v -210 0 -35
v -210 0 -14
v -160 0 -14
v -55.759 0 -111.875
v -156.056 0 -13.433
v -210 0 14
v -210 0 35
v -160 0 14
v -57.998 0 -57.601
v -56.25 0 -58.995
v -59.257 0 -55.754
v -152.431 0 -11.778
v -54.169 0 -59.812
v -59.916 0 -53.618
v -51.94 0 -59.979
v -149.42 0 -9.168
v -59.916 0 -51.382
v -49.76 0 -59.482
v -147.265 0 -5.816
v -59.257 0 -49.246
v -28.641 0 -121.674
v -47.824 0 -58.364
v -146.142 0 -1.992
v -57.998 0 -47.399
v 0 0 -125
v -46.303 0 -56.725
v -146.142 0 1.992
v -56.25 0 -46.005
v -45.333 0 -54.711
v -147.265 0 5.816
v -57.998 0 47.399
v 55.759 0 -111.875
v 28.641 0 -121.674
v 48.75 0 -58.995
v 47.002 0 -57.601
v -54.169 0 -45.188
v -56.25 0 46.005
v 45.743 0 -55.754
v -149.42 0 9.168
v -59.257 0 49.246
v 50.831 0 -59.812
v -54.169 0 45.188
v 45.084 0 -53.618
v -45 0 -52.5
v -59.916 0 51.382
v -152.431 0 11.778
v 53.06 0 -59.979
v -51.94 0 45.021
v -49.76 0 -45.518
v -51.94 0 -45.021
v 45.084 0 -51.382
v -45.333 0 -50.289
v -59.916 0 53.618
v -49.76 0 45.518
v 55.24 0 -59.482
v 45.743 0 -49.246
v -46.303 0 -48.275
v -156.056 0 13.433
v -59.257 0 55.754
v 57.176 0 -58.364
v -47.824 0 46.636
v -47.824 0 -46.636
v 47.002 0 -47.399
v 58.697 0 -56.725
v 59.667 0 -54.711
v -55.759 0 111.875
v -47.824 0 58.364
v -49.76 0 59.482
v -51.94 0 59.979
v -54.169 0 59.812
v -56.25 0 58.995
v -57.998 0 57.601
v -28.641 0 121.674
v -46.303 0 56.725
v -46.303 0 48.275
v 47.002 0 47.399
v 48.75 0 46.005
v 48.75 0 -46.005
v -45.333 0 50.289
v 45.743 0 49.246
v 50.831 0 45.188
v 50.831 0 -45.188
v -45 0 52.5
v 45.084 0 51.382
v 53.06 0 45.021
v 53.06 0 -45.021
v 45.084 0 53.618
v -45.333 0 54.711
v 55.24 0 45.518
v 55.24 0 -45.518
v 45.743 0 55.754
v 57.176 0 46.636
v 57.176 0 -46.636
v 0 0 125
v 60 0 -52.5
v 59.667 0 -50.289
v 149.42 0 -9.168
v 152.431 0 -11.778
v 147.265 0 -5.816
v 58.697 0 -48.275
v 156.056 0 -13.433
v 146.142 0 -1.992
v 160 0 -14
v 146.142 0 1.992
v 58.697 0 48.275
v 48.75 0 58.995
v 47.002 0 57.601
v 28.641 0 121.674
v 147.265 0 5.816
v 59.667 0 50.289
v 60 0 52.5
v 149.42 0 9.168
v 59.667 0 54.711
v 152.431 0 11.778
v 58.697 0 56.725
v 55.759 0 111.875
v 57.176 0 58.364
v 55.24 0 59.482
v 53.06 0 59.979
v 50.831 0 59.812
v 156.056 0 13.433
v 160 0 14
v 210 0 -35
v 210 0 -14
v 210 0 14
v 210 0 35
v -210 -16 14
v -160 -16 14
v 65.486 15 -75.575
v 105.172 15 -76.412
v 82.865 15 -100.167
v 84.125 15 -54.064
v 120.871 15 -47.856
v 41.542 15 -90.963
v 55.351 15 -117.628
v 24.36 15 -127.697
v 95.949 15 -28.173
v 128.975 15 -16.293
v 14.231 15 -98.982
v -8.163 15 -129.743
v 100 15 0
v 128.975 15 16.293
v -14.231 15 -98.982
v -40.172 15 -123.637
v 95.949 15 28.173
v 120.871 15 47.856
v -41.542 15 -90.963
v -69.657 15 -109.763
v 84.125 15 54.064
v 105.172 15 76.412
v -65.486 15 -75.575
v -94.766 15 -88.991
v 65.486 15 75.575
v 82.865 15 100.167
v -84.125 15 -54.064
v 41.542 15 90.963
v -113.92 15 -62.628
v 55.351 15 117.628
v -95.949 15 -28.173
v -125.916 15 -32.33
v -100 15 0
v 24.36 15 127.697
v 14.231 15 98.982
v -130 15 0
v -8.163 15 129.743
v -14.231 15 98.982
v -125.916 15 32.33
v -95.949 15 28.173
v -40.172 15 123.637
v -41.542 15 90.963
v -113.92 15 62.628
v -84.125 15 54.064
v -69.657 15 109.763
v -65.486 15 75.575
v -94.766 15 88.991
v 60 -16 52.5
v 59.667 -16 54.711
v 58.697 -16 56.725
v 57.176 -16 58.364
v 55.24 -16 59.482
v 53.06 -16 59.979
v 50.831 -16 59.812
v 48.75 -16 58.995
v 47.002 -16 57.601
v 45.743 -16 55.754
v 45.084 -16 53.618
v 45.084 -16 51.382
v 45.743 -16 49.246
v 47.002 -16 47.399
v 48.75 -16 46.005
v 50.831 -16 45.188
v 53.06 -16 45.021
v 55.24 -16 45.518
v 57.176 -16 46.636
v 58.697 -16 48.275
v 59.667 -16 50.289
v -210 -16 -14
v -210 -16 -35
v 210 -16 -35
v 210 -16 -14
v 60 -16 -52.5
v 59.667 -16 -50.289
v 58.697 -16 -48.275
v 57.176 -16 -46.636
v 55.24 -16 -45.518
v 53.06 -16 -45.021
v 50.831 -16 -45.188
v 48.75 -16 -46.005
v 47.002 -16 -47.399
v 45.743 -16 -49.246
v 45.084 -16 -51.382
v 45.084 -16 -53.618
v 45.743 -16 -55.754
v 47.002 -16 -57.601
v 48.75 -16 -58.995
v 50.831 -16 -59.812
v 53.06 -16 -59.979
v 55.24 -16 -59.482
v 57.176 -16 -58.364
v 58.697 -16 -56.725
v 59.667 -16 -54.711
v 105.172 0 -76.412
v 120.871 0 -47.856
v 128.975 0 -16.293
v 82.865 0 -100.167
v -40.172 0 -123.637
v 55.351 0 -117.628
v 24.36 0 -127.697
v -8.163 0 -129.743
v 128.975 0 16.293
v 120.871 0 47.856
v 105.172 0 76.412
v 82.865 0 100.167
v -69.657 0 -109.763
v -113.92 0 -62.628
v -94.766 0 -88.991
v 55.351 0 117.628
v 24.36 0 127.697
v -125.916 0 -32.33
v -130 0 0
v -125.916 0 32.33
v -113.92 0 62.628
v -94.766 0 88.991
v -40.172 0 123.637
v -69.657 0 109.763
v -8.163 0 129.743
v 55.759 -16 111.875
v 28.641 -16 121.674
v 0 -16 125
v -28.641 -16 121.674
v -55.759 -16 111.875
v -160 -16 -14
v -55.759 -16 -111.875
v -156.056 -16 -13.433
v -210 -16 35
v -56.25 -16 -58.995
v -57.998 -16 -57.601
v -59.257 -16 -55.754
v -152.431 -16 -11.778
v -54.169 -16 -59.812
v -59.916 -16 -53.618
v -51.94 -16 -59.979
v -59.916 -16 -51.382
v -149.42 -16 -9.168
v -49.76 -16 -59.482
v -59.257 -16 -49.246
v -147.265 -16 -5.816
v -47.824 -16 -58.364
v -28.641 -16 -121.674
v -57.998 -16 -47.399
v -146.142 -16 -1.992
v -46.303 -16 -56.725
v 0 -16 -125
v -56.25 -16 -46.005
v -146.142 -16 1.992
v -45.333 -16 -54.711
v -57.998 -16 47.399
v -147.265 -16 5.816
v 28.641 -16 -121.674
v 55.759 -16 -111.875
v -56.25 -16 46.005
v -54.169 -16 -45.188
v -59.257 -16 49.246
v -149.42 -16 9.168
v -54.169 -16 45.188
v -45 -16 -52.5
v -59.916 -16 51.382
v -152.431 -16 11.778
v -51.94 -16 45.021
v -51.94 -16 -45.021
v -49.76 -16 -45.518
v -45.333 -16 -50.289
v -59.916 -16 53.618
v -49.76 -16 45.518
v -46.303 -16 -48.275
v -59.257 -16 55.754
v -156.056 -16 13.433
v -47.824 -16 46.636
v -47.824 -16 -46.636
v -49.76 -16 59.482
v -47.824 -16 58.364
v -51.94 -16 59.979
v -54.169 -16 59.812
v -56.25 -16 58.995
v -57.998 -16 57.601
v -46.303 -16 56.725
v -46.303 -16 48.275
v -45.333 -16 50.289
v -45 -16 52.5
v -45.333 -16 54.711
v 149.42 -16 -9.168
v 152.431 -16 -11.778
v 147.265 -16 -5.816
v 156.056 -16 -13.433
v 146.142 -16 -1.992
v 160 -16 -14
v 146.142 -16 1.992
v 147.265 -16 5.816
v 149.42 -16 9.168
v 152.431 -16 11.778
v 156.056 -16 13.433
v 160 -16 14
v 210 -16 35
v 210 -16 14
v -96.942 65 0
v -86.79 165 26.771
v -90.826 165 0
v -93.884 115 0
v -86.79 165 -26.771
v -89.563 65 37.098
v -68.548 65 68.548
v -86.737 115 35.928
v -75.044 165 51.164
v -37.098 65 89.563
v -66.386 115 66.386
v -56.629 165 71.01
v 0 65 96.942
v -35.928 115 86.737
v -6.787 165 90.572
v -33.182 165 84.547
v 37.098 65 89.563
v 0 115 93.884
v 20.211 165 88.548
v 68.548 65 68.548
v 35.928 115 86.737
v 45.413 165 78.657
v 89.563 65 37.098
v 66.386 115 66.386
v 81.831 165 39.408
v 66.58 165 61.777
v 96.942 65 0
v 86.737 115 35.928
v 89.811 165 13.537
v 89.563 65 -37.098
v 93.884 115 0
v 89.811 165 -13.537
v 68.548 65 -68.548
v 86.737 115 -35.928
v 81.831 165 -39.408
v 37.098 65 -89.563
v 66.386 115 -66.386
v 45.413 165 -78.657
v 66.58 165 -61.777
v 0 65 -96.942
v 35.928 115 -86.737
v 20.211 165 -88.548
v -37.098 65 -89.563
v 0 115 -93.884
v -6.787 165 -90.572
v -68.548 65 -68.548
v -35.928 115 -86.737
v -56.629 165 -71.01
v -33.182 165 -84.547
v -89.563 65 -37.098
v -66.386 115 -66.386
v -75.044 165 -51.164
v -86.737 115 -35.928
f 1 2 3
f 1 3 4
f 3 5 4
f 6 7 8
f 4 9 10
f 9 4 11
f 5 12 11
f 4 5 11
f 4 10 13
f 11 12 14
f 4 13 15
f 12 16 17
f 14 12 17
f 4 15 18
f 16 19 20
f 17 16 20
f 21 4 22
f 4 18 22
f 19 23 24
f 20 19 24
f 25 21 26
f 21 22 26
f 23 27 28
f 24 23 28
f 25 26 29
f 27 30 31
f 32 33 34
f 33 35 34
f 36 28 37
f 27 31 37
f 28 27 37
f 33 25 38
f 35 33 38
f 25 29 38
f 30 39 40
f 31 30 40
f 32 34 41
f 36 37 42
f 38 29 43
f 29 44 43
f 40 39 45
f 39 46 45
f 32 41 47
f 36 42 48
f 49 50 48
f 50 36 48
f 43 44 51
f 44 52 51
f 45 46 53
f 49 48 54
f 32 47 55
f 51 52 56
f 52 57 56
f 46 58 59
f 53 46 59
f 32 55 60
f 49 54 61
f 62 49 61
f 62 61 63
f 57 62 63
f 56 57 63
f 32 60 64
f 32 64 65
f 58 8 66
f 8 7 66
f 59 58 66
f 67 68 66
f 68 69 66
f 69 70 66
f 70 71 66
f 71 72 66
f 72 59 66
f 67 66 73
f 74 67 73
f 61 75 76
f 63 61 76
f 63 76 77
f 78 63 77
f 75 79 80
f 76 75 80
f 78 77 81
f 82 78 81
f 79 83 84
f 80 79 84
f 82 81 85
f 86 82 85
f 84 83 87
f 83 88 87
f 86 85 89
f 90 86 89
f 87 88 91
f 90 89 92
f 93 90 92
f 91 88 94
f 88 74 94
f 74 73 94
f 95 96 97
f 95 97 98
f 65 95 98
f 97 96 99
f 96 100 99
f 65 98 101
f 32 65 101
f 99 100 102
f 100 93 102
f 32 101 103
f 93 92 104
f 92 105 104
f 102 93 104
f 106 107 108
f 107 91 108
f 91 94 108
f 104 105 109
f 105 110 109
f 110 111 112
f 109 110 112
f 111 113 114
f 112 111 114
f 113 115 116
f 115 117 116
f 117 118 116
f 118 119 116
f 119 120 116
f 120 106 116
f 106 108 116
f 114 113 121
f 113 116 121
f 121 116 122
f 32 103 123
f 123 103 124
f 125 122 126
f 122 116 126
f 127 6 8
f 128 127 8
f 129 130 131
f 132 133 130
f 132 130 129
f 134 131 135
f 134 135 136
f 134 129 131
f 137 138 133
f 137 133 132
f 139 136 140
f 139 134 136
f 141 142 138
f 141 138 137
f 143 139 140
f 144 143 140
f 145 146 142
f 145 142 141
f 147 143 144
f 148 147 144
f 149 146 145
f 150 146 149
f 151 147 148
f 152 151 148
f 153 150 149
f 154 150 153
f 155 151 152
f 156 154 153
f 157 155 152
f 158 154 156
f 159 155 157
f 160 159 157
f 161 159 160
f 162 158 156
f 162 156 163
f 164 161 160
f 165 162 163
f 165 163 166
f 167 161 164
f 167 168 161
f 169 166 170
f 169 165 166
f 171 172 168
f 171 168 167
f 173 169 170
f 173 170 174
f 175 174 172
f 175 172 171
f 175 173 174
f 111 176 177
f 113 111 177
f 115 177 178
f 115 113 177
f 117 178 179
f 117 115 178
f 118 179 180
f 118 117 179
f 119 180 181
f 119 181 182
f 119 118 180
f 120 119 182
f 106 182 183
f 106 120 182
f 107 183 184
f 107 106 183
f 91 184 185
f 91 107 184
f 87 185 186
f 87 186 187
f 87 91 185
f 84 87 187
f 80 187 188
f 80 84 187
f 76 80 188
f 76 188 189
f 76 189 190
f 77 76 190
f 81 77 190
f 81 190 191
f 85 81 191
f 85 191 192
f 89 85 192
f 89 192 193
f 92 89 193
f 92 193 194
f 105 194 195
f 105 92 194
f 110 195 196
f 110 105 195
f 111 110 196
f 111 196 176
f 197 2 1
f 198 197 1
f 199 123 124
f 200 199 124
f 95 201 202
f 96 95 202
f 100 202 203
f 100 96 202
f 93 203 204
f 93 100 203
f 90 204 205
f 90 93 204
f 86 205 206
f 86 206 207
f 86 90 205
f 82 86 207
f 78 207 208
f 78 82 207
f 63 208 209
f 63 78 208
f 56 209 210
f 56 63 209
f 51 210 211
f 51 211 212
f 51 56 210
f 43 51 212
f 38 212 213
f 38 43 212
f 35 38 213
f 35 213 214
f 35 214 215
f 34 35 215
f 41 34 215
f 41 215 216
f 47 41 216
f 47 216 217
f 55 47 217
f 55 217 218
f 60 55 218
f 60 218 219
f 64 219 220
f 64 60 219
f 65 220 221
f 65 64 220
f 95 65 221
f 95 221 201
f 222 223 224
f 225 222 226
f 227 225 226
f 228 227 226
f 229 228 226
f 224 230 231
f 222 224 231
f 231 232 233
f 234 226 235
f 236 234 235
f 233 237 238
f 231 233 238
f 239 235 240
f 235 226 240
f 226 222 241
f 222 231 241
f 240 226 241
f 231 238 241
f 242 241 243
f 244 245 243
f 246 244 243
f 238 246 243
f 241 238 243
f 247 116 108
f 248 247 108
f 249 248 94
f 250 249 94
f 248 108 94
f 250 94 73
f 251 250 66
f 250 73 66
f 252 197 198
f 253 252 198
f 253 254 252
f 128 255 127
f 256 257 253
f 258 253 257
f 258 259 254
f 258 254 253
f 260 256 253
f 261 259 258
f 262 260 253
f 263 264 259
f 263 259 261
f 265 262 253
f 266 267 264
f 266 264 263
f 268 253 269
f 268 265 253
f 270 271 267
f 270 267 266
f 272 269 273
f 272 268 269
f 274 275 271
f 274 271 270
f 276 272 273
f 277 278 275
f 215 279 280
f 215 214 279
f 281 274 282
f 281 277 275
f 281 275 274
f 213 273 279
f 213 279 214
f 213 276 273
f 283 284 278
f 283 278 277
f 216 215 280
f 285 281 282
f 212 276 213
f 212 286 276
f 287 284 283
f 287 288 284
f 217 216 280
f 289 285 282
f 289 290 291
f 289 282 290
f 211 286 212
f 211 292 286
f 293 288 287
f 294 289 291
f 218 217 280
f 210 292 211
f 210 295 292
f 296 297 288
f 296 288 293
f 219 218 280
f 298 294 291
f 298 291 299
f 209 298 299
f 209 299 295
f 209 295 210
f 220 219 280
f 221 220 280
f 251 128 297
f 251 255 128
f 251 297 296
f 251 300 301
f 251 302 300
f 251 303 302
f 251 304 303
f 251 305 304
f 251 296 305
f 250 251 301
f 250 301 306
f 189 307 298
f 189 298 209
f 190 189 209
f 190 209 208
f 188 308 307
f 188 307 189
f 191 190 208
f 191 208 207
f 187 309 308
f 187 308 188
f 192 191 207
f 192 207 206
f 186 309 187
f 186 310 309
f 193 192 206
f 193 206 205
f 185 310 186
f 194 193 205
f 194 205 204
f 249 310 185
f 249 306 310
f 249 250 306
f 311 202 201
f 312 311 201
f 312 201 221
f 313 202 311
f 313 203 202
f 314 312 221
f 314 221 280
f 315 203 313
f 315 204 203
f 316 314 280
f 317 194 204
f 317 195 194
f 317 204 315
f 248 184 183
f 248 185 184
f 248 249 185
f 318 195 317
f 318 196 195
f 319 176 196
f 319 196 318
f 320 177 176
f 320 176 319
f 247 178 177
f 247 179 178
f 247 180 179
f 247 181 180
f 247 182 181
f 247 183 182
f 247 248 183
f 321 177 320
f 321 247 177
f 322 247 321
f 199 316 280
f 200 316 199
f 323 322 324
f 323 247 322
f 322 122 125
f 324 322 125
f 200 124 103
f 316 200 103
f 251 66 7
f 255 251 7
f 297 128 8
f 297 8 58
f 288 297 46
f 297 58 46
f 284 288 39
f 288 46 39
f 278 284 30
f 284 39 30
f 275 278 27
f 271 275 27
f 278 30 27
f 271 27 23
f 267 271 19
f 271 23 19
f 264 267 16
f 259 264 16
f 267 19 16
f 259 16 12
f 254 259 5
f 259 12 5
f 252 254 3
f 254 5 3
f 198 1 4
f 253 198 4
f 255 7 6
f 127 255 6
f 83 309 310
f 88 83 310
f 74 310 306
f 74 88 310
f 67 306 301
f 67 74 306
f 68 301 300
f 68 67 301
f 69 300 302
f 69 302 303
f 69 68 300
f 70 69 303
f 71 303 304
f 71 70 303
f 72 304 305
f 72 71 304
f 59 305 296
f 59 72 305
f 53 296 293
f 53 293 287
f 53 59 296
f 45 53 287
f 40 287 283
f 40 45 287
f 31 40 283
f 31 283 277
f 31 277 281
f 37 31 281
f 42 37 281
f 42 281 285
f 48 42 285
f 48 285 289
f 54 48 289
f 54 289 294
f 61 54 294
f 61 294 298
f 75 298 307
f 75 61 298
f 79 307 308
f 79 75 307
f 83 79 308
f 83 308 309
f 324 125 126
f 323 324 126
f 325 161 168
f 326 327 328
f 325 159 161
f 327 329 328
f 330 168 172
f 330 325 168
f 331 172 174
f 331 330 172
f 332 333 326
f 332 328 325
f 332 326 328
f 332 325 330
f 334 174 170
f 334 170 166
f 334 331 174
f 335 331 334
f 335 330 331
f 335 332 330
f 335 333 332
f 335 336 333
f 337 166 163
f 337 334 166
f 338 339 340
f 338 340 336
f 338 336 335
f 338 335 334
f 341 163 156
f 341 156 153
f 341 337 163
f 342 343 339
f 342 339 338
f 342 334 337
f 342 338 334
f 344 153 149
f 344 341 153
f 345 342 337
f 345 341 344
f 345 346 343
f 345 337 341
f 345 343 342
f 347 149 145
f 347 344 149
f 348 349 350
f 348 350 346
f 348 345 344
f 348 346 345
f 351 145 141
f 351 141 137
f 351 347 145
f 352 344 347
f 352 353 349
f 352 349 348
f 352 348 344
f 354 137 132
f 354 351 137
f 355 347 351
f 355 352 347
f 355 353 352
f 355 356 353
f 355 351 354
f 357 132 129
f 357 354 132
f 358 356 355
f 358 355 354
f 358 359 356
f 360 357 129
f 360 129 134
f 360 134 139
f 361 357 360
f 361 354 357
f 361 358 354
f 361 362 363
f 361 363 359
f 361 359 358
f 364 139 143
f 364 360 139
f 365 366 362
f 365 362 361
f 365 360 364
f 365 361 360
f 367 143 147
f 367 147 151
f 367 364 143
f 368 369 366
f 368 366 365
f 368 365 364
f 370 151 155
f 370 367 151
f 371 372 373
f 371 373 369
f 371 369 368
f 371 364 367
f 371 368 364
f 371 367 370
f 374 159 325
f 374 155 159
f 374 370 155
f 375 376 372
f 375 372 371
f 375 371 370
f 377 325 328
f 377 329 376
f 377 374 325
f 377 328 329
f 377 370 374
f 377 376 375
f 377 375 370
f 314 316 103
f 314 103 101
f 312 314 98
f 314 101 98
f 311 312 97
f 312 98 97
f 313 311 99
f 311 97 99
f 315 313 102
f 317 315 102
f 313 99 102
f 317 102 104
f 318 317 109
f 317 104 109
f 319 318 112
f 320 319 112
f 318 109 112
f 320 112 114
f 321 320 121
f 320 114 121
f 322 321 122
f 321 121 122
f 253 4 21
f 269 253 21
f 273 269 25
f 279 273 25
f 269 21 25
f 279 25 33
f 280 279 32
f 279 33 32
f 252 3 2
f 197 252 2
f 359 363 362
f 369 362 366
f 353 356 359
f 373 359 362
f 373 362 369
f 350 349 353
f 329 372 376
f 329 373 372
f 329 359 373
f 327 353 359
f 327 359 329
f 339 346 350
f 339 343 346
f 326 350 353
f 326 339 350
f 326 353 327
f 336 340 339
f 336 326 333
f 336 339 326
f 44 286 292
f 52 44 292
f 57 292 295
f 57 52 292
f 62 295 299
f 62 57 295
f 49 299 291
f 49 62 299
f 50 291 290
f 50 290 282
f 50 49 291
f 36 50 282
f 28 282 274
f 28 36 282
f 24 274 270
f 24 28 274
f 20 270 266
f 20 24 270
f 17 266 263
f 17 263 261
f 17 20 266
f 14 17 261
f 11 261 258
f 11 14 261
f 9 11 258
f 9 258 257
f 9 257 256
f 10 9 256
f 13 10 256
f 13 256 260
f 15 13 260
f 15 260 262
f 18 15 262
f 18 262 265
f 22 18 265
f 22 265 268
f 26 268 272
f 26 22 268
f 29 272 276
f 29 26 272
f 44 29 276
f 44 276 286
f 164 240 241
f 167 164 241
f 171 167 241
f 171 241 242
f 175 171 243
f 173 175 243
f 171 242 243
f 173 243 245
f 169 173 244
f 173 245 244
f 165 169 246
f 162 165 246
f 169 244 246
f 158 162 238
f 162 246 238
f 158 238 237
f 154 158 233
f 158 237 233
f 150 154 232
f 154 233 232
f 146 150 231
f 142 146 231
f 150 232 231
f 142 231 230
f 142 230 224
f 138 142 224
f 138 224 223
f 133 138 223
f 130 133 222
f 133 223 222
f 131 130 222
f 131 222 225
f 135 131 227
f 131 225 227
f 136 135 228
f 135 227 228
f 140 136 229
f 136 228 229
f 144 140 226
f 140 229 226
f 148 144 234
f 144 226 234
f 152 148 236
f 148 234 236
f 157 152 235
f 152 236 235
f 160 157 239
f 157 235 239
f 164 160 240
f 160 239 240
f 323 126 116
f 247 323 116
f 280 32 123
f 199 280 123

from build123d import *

# Parameters (mm, degrees)
F0_R     = 7.5
F1_DEPTH = 16
F2_R     = 130
F3_DEPTH = 15
F4_R     = 100
F5_DEPTH = 150
F5_TAPER = 3.5


with BuildPart() as f1:
    # F0 (on Front) → F1 (new body)
    with BuildSketch(Plane.XZ):
        with BuildLine():
            Line((-210, -35), (-55.7589884753, -111.8746405769))
            ThreePointArc((-55.7589884753, -111.8746405769), (0, -125), (55.7589884753, -111.8746405769))
            Line((55.7589884753, -111.8746405769), (210, -35))
            Line((210, -35), (210, -14))
            Line((210, -14), (160, -14))
            ThreePointArc((160, -14), (146, 0), (160, 14))
            Line((160, 14), (210, 14))
            Line((210, 14), (210, 35))
            Line((210, 35), (55.7589884753, 111.8746405769))
            ThreePointArc((55.7589884753, 111.8746405769), (0, 125), (-55.7589884753, 111.8746405769))
            Line((-55.7589884753, 111.8746405769), (-210, 35))
            Line((-210, 35), (-210, 14))
            Line((-210, 14), (-160, 14))
            ThreePointArc((-160, 14), (-146, 0), (-160, -14))
            Line((-160, -14), (-210, -14))
            Line((-210, -14), (-210, -35))
        make_face()
        with Locations((-52.5, -52.5)):
            Circle(F0_R, mode=Mode.SUBTRACT)
        with Locations((52.5, -52.5)):
            Circle(F0_R, mode=Mode.SUBTRACT)
        with Locations((-52.5, 52.5)):
            Circle(F0_R, mode=Mode.SUBTRACT)
        with Locations((52.5, 52.5)):
            Circle(F0_R, mode=Mode.SUBTRACT)
    extrude(amount=F1_DEPTH)


with BuildPart() as f3:
    # F2 (on face) → F3 (new body)
    with BuildSketch(Plane(origin=(0, 0, 0), x_dir=(-1, 0, 0), z_dir=(0, 1, 0))):
        Circle(F2_R)
    extrude(amount=F3_DEPTH)

    # F4 (on face) → F5 (join)
    with BuildSketch(Plane(origin=(0, 15, 0), x_dir=(-1, 0, 0), z_dir=(0, 1, 0))):
        Circle(F4_R)
    extrude(amount=F5_DEPTH, taper=F5_TAPER)


solid = Compound([f1.part, f3.part])
